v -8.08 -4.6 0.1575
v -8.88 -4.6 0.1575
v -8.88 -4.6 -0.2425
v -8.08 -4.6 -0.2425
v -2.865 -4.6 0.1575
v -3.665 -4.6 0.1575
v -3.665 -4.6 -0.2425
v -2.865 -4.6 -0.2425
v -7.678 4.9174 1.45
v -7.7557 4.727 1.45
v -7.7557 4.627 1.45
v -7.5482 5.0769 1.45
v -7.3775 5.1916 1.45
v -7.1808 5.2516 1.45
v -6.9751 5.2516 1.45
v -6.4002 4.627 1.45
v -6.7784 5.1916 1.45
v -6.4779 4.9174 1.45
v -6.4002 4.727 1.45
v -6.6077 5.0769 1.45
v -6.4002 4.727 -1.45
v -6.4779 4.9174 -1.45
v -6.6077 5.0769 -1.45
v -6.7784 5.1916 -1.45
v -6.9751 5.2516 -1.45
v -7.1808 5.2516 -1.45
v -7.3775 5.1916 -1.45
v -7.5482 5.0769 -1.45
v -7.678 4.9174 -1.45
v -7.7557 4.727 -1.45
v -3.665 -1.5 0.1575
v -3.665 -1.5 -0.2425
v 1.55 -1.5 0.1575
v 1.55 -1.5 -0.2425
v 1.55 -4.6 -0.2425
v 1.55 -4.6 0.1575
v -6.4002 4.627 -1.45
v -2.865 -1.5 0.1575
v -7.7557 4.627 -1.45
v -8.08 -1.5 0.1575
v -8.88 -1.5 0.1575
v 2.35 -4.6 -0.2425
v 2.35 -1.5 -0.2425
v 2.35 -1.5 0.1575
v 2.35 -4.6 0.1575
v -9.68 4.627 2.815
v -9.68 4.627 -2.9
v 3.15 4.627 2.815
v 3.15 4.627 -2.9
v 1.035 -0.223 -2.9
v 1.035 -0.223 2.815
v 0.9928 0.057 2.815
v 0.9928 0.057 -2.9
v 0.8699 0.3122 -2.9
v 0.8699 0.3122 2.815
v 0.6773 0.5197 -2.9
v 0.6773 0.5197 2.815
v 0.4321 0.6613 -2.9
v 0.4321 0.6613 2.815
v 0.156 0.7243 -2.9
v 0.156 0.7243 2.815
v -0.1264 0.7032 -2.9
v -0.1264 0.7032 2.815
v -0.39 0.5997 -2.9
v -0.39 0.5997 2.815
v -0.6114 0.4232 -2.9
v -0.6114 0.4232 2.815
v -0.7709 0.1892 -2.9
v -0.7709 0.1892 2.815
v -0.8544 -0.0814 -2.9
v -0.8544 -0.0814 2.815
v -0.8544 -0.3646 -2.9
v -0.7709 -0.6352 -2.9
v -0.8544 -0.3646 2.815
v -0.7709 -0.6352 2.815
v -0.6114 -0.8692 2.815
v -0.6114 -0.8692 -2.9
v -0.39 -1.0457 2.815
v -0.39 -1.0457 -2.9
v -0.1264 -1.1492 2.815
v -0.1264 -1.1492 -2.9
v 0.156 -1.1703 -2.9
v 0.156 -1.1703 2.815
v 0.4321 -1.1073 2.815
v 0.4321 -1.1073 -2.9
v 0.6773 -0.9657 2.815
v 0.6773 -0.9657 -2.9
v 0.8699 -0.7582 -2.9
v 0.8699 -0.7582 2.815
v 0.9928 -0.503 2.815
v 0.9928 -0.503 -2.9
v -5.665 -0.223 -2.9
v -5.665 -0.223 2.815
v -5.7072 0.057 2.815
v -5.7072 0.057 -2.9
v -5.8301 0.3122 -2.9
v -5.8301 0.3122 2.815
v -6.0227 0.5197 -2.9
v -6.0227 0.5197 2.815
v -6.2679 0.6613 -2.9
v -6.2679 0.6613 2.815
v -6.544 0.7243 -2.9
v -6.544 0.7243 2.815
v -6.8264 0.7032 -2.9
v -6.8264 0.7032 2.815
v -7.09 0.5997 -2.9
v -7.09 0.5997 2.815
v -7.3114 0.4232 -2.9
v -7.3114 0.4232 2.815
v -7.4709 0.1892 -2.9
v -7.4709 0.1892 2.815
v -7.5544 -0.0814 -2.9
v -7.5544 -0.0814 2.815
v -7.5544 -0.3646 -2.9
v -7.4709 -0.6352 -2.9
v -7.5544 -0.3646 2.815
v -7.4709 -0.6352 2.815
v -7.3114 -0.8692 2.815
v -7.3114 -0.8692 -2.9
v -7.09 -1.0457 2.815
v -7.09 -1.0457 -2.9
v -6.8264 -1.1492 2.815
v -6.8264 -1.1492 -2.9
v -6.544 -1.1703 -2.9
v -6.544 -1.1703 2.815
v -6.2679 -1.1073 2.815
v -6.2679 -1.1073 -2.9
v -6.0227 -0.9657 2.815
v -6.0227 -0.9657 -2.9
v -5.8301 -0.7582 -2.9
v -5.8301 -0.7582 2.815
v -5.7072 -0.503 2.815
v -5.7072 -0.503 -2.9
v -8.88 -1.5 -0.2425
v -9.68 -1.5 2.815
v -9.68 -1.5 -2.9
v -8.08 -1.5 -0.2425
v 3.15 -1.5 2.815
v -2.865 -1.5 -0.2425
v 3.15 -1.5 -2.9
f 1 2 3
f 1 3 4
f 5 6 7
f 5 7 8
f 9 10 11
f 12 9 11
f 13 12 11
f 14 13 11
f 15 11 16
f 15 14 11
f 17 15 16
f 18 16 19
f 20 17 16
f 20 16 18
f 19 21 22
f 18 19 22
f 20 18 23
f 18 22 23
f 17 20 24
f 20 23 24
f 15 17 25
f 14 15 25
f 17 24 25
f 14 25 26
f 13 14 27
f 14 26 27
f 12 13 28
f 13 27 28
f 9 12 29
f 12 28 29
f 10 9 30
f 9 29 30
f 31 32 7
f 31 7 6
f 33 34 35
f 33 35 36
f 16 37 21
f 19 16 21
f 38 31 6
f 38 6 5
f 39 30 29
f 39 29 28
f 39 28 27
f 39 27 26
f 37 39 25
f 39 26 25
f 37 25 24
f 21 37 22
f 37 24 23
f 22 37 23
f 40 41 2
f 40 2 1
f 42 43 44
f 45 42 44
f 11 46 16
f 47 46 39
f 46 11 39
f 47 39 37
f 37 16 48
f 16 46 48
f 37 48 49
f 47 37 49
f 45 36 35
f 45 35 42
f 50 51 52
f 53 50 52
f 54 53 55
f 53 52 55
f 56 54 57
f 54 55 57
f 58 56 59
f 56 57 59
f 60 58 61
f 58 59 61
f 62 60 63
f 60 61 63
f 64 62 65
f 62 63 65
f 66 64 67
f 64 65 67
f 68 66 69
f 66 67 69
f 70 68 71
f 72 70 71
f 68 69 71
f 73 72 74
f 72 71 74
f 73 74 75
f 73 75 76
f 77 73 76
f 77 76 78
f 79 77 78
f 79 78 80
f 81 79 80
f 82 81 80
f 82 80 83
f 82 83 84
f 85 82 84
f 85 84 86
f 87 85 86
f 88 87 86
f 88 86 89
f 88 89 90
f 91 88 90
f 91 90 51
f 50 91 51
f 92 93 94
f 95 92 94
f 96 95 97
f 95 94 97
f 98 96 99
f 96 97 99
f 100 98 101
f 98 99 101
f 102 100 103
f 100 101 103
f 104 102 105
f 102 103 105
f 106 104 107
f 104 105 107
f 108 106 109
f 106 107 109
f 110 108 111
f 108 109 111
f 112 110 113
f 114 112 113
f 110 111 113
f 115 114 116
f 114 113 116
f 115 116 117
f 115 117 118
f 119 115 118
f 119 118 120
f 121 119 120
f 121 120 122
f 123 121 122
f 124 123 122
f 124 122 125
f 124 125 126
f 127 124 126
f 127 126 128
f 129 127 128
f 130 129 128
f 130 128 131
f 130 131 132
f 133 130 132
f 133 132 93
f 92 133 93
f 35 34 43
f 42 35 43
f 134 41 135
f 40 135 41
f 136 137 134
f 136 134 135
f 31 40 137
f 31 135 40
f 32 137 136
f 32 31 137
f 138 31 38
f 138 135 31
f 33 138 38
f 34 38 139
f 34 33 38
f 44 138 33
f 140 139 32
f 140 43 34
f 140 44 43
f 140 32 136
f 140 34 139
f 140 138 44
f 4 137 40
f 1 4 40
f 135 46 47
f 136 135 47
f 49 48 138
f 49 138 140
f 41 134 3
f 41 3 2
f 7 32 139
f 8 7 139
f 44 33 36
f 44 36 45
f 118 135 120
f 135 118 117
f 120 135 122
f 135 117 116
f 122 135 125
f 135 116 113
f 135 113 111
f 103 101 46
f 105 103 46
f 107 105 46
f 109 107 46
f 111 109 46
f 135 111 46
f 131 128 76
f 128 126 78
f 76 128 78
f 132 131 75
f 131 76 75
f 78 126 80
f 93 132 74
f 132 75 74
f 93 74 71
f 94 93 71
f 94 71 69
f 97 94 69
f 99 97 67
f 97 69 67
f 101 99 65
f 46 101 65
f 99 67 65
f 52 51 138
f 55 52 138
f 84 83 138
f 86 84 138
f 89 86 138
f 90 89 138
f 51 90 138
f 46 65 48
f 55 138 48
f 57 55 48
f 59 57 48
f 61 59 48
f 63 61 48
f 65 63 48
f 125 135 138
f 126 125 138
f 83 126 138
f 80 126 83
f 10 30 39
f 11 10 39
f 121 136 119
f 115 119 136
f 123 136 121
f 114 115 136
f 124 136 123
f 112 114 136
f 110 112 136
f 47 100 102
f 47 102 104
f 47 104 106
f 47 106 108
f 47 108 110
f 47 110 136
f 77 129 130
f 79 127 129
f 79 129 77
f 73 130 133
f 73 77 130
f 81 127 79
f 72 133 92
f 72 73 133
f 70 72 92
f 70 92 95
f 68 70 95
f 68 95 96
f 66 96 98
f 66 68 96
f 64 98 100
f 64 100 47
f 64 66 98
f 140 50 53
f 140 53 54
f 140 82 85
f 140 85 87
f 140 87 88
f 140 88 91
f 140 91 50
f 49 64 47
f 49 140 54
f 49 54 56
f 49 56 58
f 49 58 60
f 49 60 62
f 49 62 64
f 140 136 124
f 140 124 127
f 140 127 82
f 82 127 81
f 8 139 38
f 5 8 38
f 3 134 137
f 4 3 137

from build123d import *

# Parameters (mm, degrees)
SKETCH1_W          = 5.715
SKETCH1_H          = 6.127
EXTRUDE1_DEPTH     = 12.83
SKETCH2_R          = 0.95
CUT_EXTRUDE1_DEPTH = 20.8
SKETCH4_W          = 0.8
SKETCH4_H          = 0.4
EXTRUDE2_DEPTH     = 3.1
EXTRUDE5_DEPTH     = 2.9


with BuildPart() as part:
    # Sketch1 → Extrude1 (new body)
    with BuildSketch(Plane(origin=(3.15, 0, 0), x_dir=(0, 0, -1), z_dir=(1, 0, 0))):
        with Locations((0.0425, 1.5635)):
            Rectangle(SKETCH1_W, SKETCH1_H)
    extrude(amount=-EXTRUDE1_DEPTH)

    # Sketch2 → Cut-Extrude1 (cut)
    with BuildSketch(Plane.XY.offset(2.815)):
        with Locations((0.085, -0.223)):
            Circle(SKETCH2_R)
        with Locations((-6.615, -0.223)):
            Circle(SKETCH2_R)
    extrude(amount=-CUT_EXTRUDE1_DEPTH, mode=Mode.SUBTRACT)

    # Sketch4 → Extrude2 (add)
    with BuildSketch(Plane.XZ.offset(1.5)):
        with Locations((-8.48, -0.0425)):
            Rectangle(SKETCH4_W, SKETCH4_H)
        with Locations((-3.265, -0.0425)):
            Rectangle(SKETCH4_W, SKETCH4_H)
        with Locations((1.95, -0.0425)):
            Rectangle(SKETCH4_W, SKETCH4_H)
    extrude(amount=EXTRUDE2_DEPTH)

    # Sketch7 → Extrude5 (add)
    with BuildSketch(Plane(origin=(0, 0, -1.45), x_dir=(-1, 0, 0), z_dir=(0, 0, -1))):
        with BuildLine():
            Line((7.755679036, 4.627), (6.400179952, 4.627))
            Line((6.400179952, 4.627), (6.400179952, 4.727))
            ThreePointArc((6.400179952, 4.727), (7.077929494, 5.259200233), (7.755679036, 4.727))
            Line((7.755679036, 4.727), (7.755679036, 4.627))
        make_face()
    extrude(amount=-EXTRUDE5_DEPTH)


solid = part.part
